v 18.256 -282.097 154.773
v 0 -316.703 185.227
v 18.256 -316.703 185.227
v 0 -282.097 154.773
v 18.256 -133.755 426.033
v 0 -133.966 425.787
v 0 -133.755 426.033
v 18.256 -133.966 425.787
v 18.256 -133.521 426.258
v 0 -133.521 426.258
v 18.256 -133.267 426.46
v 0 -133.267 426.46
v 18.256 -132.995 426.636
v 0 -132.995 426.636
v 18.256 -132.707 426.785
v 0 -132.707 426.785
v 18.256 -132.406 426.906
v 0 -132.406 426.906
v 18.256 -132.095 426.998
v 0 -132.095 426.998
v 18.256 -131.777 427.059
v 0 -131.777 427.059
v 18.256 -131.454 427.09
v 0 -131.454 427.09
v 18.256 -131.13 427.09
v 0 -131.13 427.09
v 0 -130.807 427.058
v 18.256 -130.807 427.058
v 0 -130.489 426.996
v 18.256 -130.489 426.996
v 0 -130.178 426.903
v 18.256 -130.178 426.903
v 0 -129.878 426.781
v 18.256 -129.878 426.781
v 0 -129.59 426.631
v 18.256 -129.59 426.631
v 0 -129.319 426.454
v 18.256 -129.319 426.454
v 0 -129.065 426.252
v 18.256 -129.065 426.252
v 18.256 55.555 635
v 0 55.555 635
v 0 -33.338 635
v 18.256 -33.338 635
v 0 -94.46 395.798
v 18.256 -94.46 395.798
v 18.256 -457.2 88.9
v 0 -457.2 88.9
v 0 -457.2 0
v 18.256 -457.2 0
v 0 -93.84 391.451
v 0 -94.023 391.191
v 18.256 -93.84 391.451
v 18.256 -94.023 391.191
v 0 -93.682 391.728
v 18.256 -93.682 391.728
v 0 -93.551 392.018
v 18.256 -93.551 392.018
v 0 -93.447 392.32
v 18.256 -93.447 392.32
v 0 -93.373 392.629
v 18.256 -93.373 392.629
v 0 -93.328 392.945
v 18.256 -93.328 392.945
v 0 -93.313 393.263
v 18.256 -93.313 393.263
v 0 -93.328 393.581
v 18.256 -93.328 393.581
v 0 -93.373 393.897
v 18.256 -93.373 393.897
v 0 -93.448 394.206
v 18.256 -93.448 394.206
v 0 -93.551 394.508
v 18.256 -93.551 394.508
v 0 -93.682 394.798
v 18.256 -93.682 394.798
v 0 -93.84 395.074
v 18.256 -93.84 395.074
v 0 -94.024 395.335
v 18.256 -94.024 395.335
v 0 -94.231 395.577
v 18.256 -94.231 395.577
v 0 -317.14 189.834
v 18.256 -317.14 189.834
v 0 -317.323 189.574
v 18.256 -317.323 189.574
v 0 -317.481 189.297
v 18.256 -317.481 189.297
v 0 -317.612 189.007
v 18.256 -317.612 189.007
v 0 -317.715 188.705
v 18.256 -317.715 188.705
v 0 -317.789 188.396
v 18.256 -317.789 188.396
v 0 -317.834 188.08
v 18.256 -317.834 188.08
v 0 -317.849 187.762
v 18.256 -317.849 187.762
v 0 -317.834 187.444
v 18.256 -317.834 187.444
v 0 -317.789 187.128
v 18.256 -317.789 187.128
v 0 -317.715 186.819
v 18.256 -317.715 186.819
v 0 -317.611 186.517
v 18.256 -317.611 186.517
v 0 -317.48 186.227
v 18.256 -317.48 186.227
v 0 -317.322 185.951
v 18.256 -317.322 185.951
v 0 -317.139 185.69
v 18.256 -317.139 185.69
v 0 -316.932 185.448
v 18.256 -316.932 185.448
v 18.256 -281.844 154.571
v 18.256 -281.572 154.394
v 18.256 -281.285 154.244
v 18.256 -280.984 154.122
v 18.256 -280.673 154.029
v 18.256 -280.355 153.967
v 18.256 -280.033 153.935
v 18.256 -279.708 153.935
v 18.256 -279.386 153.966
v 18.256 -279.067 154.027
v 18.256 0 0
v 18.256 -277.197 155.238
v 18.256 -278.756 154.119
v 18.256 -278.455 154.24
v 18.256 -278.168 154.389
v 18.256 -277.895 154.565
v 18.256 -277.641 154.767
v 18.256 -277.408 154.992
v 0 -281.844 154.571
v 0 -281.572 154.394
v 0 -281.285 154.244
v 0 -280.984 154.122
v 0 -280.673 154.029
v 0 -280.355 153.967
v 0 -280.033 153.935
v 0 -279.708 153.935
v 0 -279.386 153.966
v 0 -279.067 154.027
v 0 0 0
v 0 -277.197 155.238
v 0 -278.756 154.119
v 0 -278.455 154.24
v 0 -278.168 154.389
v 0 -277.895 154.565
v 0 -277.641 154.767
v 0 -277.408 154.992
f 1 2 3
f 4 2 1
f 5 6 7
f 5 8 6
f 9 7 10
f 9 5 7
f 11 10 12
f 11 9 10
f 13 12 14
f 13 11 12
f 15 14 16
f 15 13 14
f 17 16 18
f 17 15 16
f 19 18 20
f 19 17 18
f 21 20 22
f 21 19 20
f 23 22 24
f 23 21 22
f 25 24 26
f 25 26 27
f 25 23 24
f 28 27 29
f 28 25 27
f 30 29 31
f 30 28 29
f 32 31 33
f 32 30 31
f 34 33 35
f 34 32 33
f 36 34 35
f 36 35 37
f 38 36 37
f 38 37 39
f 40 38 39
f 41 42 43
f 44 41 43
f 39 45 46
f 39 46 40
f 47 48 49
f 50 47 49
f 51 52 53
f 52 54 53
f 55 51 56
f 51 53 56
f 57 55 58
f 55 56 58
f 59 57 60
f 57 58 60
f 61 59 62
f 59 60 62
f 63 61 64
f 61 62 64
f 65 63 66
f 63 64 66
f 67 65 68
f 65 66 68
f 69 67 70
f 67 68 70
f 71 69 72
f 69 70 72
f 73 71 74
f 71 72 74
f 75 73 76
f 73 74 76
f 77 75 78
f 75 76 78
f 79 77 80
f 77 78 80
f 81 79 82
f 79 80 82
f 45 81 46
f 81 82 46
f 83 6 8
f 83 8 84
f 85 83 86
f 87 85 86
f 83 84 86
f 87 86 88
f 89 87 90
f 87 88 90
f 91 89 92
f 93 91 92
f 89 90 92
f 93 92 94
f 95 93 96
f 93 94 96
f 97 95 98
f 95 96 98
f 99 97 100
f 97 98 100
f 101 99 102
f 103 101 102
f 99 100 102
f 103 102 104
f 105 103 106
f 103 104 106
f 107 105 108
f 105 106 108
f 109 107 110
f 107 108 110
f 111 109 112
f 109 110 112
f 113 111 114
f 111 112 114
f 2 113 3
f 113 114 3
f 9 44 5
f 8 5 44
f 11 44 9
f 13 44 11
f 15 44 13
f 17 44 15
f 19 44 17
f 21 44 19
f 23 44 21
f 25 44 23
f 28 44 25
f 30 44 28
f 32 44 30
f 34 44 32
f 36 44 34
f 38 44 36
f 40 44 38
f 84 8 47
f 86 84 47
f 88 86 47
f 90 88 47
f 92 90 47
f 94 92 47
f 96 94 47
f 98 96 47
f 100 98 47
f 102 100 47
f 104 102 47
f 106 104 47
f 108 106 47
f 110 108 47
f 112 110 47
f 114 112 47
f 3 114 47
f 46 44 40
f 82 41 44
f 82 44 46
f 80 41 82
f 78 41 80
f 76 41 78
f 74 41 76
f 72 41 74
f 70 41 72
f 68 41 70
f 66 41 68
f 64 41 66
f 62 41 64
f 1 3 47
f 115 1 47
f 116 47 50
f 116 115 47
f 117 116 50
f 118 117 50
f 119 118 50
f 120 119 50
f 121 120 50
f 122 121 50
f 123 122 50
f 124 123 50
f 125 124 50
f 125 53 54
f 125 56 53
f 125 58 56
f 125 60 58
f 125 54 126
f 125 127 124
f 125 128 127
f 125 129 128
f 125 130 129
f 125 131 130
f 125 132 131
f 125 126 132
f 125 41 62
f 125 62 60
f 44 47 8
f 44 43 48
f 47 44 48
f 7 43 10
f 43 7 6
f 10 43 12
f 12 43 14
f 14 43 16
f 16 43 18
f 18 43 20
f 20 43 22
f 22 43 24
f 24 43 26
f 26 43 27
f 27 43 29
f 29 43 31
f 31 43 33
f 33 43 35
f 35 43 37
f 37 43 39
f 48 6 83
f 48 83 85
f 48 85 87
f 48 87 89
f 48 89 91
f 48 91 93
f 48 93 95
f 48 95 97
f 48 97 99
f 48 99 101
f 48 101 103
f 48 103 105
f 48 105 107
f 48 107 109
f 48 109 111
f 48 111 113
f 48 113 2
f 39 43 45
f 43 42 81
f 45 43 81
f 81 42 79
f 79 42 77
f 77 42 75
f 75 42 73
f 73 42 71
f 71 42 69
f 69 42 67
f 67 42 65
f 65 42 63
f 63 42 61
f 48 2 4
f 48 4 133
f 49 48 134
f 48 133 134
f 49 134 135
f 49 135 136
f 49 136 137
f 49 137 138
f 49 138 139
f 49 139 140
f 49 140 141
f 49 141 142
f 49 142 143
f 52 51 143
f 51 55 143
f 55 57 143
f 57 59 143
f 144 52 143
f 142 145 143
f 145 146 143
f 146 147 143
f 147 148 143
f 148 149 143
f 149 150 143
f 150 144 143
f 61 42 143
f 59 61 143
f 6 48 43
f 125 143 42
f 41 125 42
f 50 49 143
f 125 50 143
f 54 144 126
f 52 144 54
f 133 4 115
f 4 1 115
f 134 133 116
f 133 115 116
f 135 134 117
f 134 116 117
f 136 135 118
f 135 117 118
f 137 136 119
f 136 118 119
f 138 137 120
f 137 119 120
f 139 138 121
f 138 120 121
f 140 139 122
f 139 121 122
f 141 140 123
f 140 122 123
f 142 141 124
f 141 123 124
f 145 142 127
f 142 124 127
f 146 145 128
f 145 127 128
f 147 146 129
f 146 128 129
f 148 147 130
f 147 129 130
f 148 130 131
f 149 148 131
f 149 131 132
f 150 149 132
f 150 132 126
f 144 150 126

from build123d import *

# Parameters (mm, degrees)
BOSS_EXTRUDE1_DEPTH = 18.25625
CUT_EXTRUDE1_DEPTH  = 783.681372376
FILLET1_R           = 3.3782


with BuildPart() as part:
    # Sketch1 → Boss-Extrude1 (new body)
    with BuildSketch(Plane(origin=(0, 0, 0), x_dir=(0, 0, -1), z_dir=(1, 0, 0))):
        Polygon((0, 0), (-635, 55.555301339), (-635, -33.3375), (-88.9, -457.2), (0, -457.2), align=None)
    extrude(amount=BOSS_EXTRUDE1_DEPTH)

    # Sketch3 → Cut-Extrude1 (cut, through all)
    with BuildSketch(Plane.ZY):
        Polygon((428.625, -131.7625), (187.325, -319.0875), (152.4, -279.4), (393.7, -92.075), align=None)
    extrude(amount=-CUT_EXTRUDE1_DEPTH, mode=Mode.SUBTRACT)

    # Fillet1
    fillet1_edges = [part.edges().sort_by_distance(p)[0] for p in [
        (9.128125, -319.0875, 187.325),
        (9.128125, -279.4, 152.4),
        (9.128125, -92.075, 393.7),
        (9.128125, -131.7625, 428.625),
    ]]
    fillet(fillet1_edges, radius=FILLET1_R)


solid = part.part
